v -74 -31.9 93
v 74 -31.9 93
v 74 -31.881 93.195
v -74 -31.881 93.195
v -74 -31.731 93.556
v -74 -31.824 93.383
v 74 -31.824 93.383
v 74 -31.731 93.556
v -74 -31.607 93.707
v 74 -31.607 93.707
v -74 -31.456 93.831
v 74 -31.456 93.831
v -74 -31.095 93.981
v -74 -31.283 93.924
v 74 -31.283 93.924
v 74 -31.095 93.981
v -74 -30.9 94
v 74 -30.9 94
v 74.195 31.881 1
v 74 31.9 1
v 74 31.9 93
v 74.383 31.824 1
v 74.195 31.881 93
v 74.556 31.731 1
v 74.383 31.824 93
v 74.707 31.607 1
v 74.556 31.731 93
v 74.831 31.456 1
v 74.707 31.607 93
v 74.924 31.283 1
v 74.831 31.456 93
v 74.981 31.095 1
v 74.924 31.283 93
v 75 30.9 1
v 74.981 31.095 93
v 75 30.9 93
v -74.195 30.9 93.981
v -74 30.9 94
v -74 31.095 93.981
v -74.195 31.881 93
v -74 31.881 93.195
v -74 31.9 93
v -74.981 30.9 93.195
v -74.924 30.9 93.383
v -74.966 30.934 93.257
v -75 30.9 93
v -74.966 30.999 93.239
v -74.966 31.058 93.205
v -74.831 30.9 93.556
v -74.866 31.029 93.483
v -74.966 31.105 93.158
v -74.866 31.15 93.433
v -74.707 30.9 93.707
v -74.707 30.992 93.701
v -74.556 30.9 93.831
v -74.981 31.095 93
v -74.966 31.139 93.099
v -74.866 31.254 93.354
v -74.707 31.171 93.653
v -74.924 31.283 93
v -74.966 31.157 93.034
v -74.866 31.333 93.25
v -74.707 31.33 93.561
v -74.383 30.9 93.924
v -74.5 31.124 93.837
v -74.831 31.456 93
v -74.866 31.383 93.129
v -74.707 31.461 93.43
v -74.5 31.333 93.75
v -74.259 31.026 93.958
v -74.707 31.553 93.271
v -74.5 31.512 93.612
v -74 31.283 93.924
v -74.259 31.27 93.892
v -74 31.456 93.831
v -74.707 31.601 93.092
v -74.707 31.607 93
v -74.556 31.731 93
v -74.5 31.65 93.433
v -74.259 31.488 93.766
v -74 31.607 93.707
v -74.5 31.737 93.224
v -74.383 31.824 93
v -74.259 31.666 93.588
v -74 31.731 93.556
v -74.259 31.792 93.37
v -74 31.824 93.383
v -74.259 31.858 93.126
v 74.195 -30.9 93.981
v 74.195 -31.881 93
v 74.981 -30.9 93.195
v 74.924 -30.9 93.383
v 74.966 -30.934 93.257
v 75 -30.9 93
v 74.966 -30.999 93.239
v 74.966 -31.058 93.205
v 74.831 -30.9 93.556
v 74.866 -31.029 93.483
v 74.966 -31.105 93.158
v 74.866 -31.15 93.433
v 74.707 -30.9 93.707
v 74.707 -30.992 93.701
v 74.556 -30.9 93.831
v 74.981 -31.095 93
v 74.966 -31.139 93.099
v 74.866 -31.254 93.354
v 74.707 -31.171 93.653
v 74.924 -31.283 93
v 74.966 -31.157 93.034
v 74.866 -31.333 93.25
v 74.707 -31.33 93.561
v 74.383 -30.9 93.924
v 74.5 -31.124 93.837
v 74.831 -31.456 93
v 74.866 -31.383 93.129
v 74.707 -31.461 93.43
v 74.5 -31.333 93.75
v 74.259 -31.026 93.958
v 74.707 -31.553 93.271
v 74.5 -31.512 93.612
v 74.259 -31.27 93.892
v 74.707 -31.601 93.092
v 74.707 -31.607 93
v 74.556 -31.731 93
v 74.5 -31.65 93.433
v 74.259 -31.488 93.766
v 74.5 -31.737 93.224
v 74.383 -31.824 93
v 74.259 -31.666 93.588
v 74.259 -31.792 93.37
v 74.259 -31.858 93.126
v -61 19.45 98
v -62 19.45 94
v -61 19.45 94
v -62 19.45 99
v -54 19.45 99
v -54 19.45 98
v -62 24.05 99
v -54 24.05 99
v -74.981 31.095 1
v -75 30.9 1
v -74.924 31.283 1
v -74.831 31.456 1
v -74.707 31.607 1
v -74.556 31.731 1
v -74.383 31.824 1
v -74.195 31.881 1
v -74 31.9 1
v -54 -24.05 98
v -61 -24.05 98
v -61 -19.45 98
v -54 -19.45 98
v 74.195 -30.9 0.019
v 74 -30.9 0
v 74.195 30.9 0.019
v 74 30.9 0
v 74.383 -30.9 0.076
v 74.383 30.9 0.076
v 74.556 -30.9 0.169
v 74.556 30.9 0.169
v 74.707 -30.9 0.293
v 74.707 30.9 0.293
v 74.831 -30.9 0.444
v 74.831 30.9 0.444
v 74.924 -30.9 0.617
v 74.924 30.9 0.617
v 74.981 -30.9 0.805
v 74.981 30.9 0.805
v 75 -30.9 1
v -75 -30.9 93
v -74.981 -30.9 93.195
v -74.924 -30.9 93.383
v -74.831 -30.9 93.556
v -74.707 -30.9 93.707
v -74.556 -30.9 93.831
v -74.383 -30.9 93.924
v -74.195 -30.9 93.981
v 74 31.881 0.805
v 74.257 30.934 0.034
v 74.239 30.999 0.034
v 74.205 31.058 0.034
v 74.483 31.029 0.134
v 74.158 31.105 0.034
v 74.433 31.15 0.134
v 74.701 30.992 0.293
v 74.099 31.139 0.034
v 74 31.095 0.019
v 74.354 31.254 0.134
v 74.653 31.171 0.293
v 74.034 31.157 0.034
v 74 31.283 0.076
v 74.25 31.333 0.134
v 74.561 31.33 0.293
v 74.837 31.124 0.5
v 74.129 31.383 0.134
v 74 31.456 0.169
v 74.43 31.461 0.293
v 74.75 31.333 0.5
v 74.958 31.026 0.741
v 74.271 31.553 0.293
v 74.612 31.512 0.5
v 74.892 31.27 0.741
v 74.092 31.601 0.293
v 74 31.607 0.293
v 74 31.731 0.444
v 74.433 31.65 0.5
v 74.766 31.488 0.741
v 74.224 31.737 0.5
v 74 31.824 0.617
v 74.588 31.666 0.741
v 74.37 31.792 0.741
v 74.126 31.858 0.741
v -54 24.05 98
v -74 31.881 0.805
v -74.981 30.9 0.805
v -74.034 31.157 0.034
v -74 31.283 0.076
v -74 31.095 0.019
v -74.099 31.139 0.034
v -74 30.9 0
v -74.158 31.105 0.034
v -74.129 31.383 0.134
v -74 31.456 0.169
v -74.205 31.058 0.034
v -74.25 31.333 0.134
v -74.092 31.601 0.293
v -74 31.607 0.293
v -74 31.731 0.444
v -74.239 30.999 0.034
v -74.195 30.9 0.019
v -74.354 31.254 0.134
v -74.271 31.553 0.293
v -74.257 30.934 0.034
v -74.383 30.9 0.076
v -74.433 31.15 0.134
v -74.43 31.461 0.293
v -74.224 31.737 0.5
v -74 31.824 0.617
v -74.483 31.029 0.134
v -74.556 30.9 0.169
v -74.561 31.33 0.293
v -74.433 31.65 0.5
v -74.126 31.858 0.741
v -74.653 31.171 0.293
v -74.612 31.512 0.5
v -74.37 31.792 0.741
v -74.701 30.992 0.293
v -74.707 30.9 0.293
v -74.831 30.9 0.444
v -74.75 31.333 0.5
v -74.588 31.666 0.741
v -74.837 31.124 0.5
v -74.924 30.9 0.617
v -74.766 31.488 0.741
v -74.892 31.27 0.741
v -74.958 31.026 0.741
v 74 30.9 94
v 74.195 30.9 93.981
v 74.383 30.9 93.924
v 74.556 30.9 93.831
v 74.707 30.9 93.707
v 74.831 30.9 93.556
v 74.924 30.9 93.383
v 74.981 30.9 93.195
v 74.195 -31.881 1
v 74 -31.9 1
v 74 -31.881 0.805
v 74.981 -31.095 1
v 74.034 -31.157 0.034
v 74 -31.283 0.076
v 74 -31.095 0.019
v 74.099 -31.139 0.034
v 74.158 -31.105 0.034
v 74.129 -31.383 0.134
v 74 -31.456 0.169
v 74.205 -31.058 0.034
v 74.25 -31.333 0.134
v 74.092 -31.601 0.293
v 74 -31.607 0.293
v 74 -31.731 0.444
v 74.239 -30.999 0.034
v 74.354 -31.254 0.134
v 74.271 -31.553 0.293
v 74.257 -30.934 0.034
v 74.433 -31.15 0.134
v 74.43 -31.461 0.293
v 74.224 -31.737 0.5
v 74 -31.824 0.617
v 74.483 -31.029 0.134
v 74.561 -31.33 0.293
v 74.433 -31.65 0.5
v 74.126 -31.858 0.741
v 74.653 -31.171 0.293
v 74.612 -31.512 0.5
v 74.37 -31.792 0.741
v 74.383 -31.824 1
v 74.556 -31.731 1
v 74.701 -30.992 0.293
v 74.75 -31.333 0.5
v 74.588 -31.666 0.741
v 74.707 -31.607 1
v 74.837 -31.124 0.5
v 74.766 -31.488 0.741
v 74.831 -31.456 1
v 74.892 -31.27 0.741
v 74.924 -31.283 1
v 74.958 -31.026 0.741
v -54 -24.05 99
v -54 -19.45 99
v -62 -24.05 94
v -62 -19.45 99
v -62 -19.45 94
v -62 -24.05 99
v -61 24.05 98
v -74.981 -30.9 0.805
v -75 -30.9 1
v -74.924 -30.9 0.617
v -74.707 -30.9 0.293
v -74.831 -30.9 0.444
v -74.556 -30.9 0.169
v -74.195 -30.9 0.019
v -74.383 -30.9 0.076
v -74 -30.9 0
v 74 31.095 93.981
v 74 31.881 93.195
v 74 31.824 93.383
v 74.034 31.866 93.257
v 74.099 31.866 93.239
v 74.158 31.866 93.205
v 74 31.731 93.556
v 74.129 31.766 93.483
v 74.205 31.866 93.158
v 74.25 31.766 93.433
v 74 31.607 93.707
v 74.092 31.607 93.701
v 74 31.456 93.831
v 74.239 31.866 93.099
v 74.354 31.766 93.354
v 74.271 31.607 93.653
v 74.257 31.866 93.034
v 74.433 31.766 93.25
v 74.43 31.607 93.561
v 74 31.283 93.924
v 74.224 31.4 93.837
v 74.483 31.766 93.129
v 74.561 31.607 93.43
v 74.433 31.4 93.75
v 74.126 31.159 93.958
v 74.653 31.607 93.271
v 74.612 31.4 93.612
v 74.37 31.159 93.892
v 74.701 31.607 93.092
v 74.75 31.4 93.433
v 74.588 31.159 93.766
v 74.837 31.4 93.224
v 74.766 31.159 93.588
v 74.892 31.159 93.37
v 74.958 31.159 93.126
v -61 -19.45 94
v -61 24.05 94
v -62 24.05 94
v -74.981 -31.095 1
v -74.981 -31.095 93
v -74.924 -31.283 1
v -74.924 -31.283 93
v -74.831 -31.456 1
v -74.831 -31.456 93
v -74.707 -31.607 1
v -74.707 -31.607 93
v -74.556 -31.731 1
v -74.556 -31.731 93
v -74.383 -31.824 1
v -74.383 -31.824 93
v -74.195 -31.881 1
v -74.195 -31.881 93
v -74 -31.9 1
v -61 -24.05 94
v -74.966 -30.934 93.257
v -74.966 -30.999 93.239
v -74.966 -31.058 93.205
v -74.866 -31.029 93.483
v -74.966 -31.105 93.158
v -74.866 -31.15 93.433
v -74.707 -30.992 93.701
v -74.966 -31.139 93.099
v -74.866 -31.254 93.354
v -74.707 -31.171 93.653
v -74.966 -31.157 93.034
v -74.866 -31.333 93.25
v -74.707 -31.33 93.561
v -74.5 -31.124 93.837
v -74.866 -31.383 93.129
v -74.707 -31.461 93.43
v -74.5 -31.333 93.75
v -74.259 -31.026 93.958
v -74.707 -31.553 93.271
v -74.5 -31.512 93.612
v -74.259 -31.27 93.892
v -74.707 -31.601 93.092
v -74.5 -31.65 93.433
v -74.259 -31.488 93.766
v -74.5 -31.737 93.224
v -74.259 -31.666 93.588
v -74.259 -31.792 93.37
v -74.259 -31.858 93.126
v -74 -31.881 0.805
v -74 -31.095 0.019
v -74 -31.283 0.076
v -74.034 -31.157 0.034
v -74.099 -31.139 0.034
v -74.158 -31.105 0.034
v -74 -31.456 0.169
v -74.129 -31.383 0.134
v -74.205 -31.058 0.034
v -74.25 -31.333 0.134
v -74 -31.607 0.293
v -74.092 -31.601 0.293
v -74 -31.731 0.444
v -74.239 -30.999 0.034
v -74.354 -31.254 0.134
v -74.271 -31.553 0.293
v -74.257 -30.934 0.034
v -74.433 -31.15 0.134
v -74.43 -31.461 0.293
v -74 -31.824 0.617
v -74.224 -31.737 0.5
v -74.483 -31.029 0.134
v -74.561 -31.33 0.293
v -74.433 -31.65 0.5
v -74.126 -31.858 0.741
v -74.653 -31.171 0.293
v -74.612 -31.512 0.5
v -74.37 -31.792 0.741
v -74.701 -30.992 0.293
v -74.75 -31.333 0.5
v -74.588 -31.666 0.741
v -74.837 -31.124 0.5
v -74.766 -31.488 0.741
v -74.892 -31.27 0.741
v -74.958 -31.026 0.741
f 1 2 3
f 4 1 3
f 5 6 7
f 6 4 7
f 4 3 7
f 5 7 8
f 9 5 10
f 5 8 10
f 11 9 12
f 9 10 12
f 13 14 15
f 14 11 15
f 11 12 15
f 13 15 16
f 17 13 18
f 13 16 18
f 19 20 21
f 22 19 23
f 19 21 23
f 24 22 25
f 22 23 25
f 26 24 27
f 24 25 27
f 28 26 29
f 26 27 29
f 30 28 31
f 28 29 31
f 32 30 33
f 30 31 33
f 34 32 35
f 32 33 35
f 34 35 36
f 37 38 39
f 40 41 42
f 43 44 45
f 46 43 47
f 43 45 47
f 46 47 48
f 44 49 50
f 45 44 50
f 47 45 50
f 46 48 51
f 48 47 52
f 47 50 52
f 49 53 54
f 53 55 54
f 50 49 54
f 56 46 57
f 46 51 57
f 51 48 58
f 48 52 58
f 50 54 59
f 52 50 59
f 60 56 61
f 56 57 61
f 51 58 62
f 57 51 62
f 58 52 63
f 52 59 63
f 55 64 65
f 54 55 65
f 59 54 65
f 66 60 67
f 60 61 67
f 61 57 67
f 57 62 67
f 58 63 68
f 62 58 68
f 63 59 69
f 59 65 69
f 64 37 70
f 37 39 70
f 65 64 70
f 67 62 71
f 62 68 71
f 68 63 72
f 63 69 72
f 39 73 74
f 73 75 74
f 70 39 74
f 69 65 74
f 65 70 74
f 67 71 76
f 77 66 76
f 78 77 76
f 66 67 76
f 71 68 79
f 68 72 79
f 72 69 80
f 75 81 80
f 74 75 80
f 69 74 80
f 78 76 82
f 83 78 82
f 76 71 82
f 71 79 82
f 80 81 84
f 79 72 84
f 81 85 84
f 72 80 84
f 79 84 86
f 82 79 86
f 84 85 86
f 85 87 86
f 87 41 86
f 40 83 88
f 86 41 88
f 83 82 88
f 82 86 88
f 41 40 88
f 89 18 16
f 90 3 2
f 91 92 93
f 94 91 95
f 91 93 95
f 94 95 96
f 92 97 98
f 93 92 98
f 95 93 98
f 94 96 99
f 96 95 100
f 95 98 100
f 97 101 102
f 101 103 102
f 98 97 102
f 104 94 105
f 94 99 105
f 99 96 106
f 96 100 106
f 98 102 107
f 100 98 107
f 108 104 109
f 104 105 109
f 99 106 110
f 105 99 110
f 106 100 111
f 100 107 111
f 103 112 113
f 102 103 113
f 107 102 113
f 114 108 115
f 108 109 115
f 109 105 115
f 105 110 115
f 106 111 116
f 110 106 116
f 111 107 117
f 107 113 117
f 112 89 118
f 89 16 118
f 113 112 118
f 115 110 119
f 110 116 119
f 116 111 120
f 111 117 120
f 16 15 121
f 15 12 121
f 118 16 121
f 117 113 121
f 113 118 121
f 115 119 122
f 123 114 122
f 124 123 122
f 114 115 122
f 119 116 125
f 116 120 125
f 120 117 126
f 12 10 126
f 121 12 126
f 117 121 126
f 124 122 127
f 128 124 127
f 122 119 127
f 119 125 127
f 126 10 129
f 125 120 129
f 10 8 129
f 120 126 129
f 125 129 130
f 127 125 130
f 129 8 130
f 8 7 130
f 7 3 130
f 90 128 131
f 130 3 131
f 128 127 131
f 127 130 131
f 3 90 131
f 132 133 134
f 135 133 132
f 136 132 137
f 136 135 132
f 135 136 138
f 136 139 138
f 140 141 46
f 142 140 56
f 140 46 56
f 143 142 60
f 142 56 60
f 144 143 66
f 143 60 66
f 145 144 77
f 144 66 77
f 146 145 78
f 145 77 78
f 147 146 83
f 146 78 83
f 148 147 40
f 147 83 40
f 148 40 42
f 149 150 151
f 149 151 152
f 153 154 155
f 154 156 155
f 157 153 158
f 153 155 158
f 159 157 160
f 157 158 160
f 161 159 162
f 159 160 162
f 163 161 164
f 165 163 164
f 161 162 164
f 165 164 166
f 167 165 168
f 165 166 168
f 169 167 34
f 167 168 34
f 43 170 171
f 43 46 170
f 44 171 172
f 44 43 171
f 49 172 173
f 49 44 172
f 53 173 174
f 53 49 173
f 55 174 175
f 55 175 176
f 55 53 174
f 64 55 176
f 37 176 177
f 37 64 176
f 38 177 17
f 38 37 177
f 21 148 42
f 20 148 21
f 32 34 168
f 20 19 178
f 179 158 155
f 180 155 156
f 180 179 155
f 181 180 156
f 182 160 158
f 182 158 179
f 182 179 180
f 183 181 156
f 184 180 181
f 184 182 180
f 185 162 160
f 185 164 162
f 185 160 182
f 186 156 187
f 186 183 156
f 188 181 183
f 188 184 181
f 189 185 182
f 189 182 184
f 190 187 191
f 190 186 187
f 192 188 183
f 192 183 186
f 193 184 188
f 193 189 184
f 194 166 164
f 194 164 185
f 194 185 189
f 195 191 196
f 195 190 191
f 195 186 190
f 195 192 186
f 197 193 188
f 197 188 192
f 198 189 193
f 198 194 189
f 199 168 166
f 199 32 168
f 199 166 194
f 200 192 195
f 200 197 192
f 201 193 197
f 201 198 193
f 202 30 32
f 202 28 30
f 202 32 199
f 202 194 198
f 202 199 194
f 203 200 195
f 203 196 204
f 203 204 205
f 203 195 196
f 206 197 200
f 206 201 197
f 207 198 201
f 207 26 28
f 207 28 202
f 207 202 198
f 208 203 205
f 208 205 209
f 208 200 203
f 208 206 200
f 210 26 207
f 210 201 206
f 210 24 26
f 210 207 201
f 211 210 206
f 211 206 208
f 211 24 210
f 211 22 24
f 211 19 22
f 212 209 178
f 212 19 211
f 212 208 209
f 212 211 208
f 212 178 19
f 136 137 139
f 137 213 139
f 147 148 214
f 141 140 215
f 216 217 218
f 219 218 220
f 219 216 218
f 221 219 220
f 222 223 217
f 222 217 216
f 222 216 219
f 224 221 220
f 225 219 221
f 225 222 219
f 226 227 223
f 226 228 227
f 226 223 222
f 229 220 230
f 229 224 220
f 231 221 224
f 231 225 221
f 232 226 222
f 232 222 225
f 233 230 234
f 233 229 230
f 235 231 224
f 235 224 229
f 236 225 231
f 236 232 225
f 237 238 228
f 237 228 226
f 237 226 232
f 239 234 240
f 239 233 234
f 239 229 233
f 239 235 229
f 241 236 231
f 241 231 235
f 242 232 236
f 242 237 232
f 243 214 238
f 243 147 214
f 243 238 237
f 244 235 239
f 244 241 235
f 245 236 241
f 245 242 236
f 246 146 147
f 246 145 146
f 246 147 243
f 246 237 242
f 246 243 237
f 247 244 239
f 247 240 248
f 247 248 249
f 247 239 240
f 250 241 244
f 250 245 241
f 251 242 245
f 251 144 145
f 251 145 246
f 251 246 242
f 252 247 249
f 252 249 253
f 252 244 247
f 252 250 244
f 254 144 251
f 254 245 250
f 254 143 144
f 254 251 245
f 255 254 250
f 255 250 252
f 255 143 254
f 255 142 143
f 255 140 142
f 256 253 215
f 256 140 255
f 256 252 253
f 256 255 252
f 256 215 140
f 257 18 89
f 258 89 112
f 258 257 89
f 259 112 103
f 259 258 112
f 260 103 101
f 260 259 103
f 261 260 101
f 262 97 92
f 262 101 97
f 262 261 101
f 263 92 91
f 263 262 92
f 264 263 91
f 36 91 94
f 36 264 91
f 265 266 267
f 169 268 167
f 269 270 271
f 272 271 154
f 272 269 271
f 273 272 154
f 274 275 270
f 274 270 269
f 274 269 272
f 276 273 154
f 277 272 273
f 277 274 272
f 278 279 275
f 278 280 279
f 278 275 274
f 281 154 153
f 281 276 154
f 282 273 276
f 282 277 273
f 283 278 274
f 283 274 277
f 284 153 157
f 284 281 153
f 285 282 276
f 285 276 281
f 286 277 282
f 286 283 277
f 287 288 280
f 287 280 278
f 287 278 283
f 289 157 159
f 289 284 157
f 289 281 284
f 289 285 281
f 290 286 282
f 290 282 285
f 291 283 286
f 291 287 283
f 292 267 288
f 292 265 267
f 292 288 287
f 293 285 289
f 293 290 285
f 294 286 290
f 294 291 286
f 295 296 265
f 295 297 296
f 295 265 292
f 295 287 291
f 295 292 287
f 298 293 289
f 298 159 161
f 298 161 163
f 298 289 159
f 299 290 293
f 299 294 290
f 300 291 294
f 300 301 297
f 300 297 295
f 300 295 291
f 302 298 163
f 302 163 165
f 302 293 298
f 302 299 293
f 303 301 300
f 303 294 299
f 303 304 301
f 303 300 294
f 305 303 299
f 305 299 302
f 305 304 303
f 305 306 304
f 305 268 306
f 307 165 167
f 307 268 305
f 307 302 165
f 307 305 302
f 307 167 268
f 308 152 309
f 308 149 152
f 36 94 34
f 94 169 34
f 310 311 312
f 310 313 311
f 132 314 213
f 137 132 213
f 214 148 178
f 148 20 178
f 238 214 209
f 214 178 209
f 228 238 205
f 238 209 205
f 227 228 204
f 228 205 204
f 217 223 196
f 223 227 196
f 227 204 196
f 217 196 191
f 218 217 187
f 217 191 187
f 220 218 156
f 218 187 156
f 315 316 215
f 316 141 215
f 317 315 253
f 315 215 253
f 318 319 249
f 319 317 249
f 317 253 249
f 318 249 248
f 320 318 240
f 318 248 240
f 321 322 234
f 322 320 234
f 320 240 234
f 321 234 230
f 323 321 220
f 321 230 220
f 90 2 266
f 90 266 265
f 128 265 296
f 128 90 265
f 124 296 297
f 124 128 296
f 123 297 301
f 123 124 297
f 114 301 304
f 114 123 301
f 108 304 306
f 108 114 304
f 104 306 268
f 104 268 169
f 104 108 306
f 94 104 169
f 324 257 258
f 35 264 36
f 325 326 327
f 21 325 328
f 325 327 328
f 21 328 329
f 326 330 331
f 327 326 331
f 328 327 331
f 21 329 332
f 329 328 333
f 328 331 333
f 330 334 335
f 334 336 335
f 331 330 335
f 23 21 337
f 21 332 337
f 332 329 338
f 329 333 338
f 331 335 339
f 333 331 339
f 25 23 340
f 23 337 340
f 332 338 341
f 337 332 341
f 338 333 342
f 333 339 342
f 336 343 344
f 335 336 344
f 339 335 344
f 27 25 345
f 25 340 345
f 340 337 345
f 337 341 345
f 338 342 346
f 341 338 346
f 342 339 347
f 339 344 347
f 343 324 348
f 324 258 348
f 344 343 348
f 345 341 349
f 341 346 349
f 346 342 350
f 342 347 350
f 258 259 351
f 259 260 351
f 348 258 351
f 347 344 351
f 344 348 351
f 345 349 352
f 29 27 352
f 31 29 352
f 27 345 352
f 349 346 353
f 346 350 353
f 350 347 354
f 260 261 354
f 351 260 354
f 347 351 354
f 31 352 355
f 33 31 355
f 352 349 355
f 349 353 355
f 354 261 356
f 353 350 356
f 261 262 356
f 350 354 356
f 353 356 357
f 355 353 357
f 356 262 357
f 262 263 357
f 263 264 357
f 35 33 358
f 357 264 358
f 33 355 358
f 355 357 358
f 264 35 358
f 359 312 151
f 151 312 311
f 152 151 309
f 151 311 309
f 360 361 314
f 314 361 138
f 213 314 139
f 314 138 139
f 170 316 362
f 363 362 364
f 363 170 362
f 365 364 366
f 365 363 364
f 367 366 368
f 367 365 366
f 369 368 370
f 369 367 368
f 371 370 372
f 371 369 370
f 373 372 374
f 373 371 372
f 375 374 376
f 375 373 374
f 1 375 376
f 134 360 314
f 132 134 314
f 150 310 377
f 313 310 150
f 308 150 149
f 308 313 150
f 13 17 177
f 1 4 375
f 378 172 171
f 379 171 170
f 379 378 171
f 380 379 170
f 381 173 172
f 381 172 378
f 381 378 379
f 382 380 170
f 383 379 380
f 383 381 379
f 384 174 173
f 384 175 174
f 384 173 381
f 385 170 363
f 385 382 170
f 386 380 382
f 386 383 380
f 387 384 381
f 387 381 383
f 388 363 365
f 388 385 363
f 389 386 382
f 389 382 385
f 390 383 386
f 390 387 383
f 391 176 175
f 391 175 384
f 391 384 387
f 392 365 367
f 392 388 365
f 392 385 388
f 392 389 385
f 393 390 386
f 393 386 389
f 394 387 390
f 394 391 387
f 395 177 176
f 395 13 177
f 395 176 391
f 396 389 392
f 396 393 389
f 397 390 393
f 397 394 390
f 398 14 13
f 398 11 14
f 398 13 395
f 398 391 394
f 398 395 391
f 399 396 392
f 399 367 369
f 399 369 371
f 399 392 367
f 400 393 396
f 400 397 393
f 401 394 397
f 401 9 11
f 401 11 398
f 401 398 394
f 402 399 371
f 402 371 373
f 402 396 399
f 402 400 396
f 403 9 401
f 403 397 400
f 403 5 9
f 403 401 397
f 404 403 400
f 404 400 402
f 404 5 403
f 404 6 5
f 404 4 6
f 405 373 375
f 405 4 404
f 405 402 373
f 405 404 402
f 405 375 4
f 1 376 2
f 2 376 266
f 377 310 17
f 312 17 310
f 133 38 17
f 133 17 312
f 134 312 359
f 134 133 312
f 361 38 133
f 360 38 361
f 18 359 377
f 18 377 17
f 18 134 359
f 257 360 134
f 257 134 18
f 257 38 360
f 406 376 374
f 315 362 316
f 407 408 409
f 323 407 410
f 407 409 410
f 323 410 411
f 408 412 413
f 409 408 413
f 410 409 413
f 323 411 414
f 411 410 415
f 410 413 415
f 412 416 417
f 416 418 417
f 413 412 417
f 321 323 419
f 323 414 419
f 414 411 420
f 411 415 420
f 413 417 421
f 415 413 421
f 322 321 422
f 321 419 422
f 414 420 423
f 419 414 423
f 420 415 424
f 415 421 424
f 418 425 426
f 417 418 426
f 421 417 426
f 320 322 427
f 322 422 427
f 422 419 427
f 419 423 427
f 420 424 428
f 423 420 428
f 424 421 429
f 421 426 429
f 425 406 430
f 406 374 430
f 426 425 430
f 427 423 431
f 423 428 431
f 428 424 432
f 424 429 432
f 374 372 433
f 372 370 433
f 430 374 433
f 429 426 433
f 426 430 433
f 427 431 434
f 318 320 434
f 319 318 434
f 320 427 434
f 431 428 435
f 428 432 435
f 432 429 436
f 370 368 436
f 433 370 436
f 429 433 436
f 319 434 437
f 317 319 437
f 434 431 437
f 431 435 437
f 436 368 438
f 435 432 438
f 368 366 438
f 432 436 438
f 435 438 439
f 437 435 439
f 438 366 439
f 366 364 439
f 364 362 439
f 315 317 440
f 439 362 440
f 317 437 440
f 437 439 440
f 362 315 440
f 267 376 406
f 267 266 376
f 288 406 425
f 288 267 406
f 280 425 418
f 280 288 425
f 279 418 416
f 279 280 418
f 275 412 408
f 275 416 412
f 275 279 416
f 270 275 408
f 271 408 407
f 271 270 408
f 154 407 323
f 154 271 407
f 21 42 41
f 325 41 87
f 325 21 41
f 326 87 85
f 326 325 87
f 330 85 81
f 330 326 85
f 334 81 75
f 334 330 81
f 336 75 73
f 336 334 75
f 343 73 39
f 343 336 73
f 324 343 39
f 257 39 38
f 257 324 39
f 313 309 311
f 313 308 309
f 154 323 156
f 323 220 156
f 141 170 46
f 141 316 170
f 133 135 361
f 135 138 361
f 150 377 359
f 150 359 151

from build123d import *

# Parameters (mm, degrees)
F0_W     = 150
F0_H     = 63.8
F1_DEPTH = 94
F4_DEPTH = 2.3
F5_R     = 1


# Not quite as in the source:
# - a pattern or mirror of a feature is missing from the dataset's text; its kind, count and spacing are read off the source's solid


with BuildPart() as f1:
    # F0 (on Top) → F1 (new body)
    with BuildSketch(Plane.XY):
        Rectangle(F0_W, F0_H)
    extrude(amount=F1_DEPTH)

    # F3 (on offset) → F4 (join, symmetric)
    with BuildSketch(Plane.XZ.offset(21.75)):
        Polygon((-62, 99), (-62, 94), (-61, 94), (-61, 98), (-54, 98), (-54, 99), align=None)
    f4 = extrude(amount=F4_DEPTH, both=True)

    # F4_copies: F4 across plane
    add(f4.mirror(Plane.ZX))

    # F5
    f5_edges = [f1.edges().sort_by_distance(p)[0] for p in [
        (0, -31.9, 94),
        (75, 0, 94),
        (0, 31.9, 94),
        (-75, 0, 94),
        (-75, -31.9, 47),
        (75, -31.9, 47),
        (0, -31.9, 0),
        (75, 31.9, 47),
        (75, 0, 0),
        (-75, 31.9, 47),
        (0, 31.9, 0),
        (-75, 0, 0),
    ]]
    fillet(f5_edges, radius=F5_R)


solid = f1.part
